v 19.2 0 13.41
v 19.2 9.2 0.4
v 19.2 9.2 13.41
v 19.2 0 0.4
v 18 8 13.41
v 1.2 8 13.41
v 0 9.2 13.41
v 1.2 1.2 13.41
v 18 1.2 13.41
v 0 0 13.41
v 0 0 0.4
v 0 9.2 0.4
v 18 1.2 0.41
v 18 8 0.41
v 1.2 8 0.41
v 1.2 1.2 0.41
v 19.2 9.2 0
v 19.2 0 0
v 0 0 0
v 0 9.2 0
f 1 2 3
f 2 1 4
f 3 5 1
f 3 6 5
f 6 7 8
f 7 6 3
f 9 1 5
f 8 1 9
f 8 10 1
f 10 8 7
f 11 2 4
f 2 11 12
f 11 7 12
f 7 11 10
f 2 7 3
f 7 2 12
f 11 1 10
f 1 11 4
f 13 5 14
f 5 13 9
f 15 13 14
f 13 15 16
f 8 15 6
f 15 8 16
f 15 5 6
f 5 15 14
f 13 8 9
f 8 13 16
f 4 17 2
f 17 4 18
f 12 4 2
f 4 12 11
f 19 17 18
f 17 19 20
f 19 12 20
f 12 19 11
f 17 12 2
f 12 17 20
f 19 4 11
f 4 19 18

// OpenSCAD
// file: ../../Base/Boxes.scad
// Fischertechnik Box Foundation
// Pre-designed Boxes

use <Constants.scad>

include <PlacementOptions.scad>

box190Width = 190;
box190Depth = 130;
box130Width = 130;
box130Depth = 95;
boxUsageHeight = 33.9;
boxWallThickness = 2.4;
boxBaseThickness = 1.0;
boxWebWidth = 3.0;

// getBoxWallThickness()
// Gets the wall thickness of a Fischertechnik Box

function getBoxWallThickness() = boxWallThickness;

// Gets the usable height of a fischertechnik box
function getBoxUsageHeight() = boxUsageHeight;

// Gets the thickness of the Fischertechnik box base.
function getBoxBaseThickness() = boxBaseThickness;

// Gets the width of a box web
function getBoxWebWidth() = boxWebWidth;

// Gets the usable inner space of a Box 190 as an x/y-list
function getBox190Space() = [
    box190Width - 2*getBoxWallThickness(), 
    box190Depth - 2*getBoxWallThickness() ];

// Imports the Fischertechnik empty box 130x190 mm and places it at position 0,0
// 190x130 are the outer sizes, the inner space is slightly smaller. Use getBox190Space() to get the inner sizes.
// This module needs the STL file "Fischertechnik Box 130x190.stl" in the library path.
// The box is positioned that the usable inner space is at the 0,0,0 position. The

module Box190() {
    translate([-getBoxWallThickness(),-getBoxWallThickness(),-getBoxBaseThickness()])
        import("Fischertechnik Box 130x190.stl", convexity=3);
}

// Gets the usable inner space of a Box 130 as an x/y-list
function getBox130Space() = [
    box130Width - 2*getBoxWallThickness(), 
    box130Depth - 2*getBoxWallThickness() ];

// Imports the Fischertechnik empty box 95x130 mm and places it at position 0,0
// 190x130 are the outer sizes, the inner space is slightly smaller. Use getBox190Space() to get the inner sizes.
// This module needs the STL file "Fischertechnik Box 95x130.stl" in the library path.
// The box is positioned that the usable inner space is at the 0,0,0 position. The

module Box130() {
    translate([-getBoxWallThickness(),-getBoxWallThickness(),-getBoxBaseThickness()])
        import("Fischertechnik Box 95x130.stl", convexity=3);
}

// Creates a web at the specified box walls
// corner 0 = LowerLeft, 1 = UpperLeft, 2 = UpperRight, 3 = LowerRight
// side 0 = LeftOfCorner, 1 = RightOfCorner
// distance = Distance in mm from the corner
// box = inner width and depth of the box (default: Box 190)
// webWidth = length of the web (default is 3 mms)
// webThickness = thickness of the web (default is 1 mm)

module BoxWeb(corner, side, distance, box=getBox190Space(), webWidth=getBoxWebWidth(), webThickness=1.0) {
    sink = getBoxWallThickness()/2;

    width = (corner % 2 == 0) ? 
            (side == LeftOfCorner ? webWidth : webThickness) :
            (side == LeftOfCorner ? webThickness : webWidth);

    depth = (corner % 2 == 0) ? 
            (side == RightOfCorner ? webWidth : webThickness) :
            (side == RightOfCorner ? webThickness : webWidth);
    
    xDiff = corner == LowerLeft ? 
                (side == LeftOfCorner ? -sink : distance) :
            (corner == UpperLeft ?                
                (side == LeftOfCorner ? distance : -sink) :
            (corner == UpperRight ?
                (side == LeftOfCorner ? box.x-webWidth+sink : box.x-distance-webThickness) :
                (side == LeftOfCorner ? box.x-distance-webThickness: box.x-webWidth+sink)));

    yDiff = corner == LowerLeft ? 
                (side == RightOfCorner ? -sink : distance) :
            (corner == UpperLeft ?
                (side == RightOfCorner ? box.y-distance : box.y-webWidth+sink) :
            (corner == UpperRight ?
                (side == RightOfCorner ? box.y-webWidth+sink : box.y-distance) :
                (side == RightOfCorner ? distance : -sink)));
    
    translate([xDiff, yDiff, -getExcess()])
        cube([width, depth, boxUsageHeight + 2*getExcess()]);
}
// file: ../../Base/Rotation.scad
// Fischertechnik Box Foundation
// Geometry Helpers Rotation

include <PlacementOptions.scad>

// getRotatedSpace(space, rotation=NoRotation)
// Rotates the space dependent on the specified rotation

function getRotatedSpace(space, rotation=NoRotation) = [
    (rotation == Rotate90 || rotation == Rotate270) ? space.y : space.x,
    (rotation == Rotate90 || rotation == Rotate270) ? space.x : space.y
];

// Rotates the given space around the fixed left lower corner
// space = the space the children needs as width/depth list [width,depth]
// rotation = 0 Rotate0 degrees, 1 Rotate90 degrees, 2 Rotate180 degrees, 3 Rotate270 degrees (equivalent to -90)

module RotateFix(space, rotation=Rotate0) {
    dy = (rotation == Rotate0 || rotation == Rotate270) ? 0 :
        (rotation == Rotate90) ? space.x :
        space.y;
    dx = (rotation < Rotate180) ? 0 :
        (rotation == Rotate180) ? space.x :
        space.y;
    
    translate([dx, dy, 0])
        rotate([0, 0, rotations[rotation]])
            children();
}
// file: ../../Base/Alignment.scad
// Fischertechnik Box Foundation
// Geometry Helpers Alignment

include <PlacementOptions.scad>

// getAlignedX(elementWidth, spaceWidth, align=AlignRight, offset=0)
// Gets the aligned X offset of an element with the given
// width in the given space.
// elementWidth = The width of the element to positon
// spaceWidth = The space where the element should be aligned
// align = 0 AlignLeft, 1 AlignCenter, 2 AlignRight
// offset = an optional offset from the aligned position. When
// aligned left or centered, then positive values are in X direction.
// When aligned right then positive values are in negative X direction.

function getAlignedX(elementWidth, spaceWidth, align=AlignRight, offset=0) =
    (align == AlignLeft) ?
        offset :
        ((align == AlignCenter) ?
        (spaceWidth - elementWidth)/2 + offset :
        spaceWidth - offset - elementWidth);

// getAlignedY(elementDepth, spaceDepth, align=AlignTop, offset=0)
// Gets the aligned Y offset of an element with the given
// depth in the given space.
// elementDepth = The depth of the element to positon
// spaceDepth = The space where the element should be aligned
// align = 0 AlignBottom, 1 AlignCenter, 2 AlignTop
// offset = an optional offset from the aligned position. When
// aligned bottom or centered, then positive values are in Y direction.
// When aligned top then positive values are in negative Y direction.

function getAlignedY(elementDepth, spaceDepth, align=AlignTop, offset=0) =
    (align == AlignBottom) ?
        offset :
        ((align == AlignCenter) ?
        (spaceDepth - elementDepth)/2 + offset :
        spaceDepth - offset - elementDepth);
// file: ../../Base/PlacementOptions.scad
// Fischertechnik Box Foundation
// Placement Options

// Alignment
NoAlign = 0;
AlignLeft = 1;
AlignBottom = 2;
AlignCenter = 3;
AlignRight = 4;
AlignTop = 5;

// Element rotation degree steps
rotations = [0, -90, -180, -270];

// Rotation
NoRotation = 0;
Rotate0 = 0;
Rotate90 = 1;
Rotate180 = 2;
Rotate270 = 3;

// Docking (seen from above)
NoDock = -1;
DockLeft = 0;
DockTop = 1;
DockRight = 2;
DockCorner = 2;
DockBottom = 3;

// Web corners
LowerLeft = 0;
UpperLeft = 1;
UpperRight = 2;
LowerRight = 3;

// Web position relative to corner
LeftOfCorner = 0;
RightOfCorner = 1;
// file: ../../Base/Placement.scad
// Fischertechnik Box Foundation
// Geometry Helpers Placement

use <Constants.scad>
use <Alignment.scad>
use <Rotation.scad>
use <Boxes.scad>

include <PlacementOptions.scad>

// Place(x=0, y=0, elementSpace=[0,0], alignX=AlignLeft, alignY=AlignBottom, rotation=Rotate0, boxSpace=getBox190Space())
// Places the child at the specified position
// y = Y-Position. This is a relative position when an X aligment is specified.
// x = X-Position. This is a relative position when an Y aligment is specified.
// elementSpace = space of the element to be placed [x,y]
// alignX = -1=NoAlign, 0 AlignLeft, 1 AlignCenter, 3 AlignRight (elementSpace and boxSpace required!)
// alignY = -1=NoAlign, 2 AlignBottom, 1 AlignCenter, 4 AlignTop (elementSpace and boxSpace required!)
// rotation = 0 Rotate0 0 degrees, 1 Rotate90 90 degrees, 
// 2 Rotate180 180 degrees, 3 Rotate270 270 degrees (equivalent to -90)
// boxSpace = Inner space of the box where the placement occurs [x,y] - default is Box 190x130 inner space

module Place(x=0, y=0, elementSpace=[0,0], 
  alignX=AlignLeft, alignY=AlignBottom, 
  rotation=NoRotation, boxSpace=getBox190Space()) {

    module Position(x, y, space, rotation=Rotate0) {
        translate([x, y, 0])
            RotateFix(space, rotation)
                children();
    }

    space = getRotatedSpace(elementSpace, rotation);
    alignedX = getAlignedX(space.x, boxSpace.x, alignX, x);
    alignedY = getAlignedY(space.y, boxSpace.y, alignY, y);
    Position(alignedX, alignedY, elementSpace, rotation)
        children();
}

// Center(space=getBox130Space(), elementSpace=[0,0])
// space = Space where the children is centered. For cylinder use centered=true and no elementSpace.
// elementSpace = space of the element to be centered [x,y]

module Center(space=getBox190Space(), elementSpace=[0,0]) {
    translate([(space.x - elementSpace.x) / 2, (space.y - elementSpace.y) / 2])
        children(0);
}

// CenterHorizontal(width=0, y=0, offset=0, space=getBox130Space())
// space = Space where the children is centered. For cylinder use centered=true and no elementSpace.
// elementSpace = space of the element to be centered [x,y]

module CenterHorizontal(width=0, y=0, offset=0, space=getBox190Space()) {
    translate([(space.x - width) / 2 + offset, y])
        children(0);
}

// CenterVertical(depth=0, x=0, offset=0, space=getBox130Space())
// space = Space where the children is centered. For cylinder use centered=true and no elementSpace.
// elementSpace = space of the element to be centered [x,y]

module CenterVertical(depth=0, x=0, offset=0, space=getBox190Space()) {
    translate([x, (space.y - depth) / 2 + offset])
        children(0);
}
// file: ../../Elements/AxisClip10.scad
// Fischertechnik Box Library
// Axis for clip 10
// 31023

use <../ModelBase/Simple.scad>

width = 12;
depth = 12;
height = 23;

// getAxisClip10Space()
// Gets the space of a frame for a clip 10 with spring ring (mot2)

function getAxisClip10Space() = [width, depth, height];

// AxisClip10()
// Axis for clip 10 with spring ring (mot2)

module AxisClip10() {
    LeveledAxisWithSpace(height, height-10, getAxisClip10Space());
}

// Tests
color("lightgray")
AxisClip10();
// file: ../../Base/Constants.scad
// Fischertechnik Box Foundation
// Constants

// Constant values necessary for multiple elements

// Base constants
dividerThickness = 1.2;
excess = 0.01;
fragments = 90;
tolerance = 0.8;

// Gets the thickness of a divider 
function getDividerThickness() = dividerThickness;

// Gets the excess that is used to merge walls into each other
function getExcess() = excess;

// Gets amount of fragments of a cylinder
function getFragments() = fragments;

// Gets the inner tolerance of a frame to each side
function getTolerance() = tolerance;


// Fischertechnik specific constants
axisDiameter = 4;
axisBottomDiameter = axisDiameter + 1;
standardEdgeDistance = 2.5;
standardWebDistance = 11.5;
standardCornerLength = 15;
tubeWallFactor = 0.8;

// Gets axis diameter
function getAxisDiameter() = axisDiameter;

// Gets axis bottom diameter for thicker part at the bottom
function getAxisBottomDiameter() = axisBottomDiameter;

// gets the standard distance to the wall of the box for dockable frames with webs
function getStandardEdgeDistance() = standardEdgeDistance;

// gets the standard distance of each web to the corner of the dockable frame
function getStandardWebDistance() = standardWebDistance;

// gets the standard length of the corner walls of a dockable frame
function getStandardCornerLength() = standardCornerLength;

// gets the wall thickness of a tube.
function getTubeWallThickness() = tubeWallFactor * getDividerThickness();
// file: ../../Elements/FramePluggedResistor.scad
// Fischertechnik Box Library
// Frame for Plugged Resistor (two plugs)
// 36381

use <../ModelBase/Simple.scad>

width = 16;
depth = 6;
height = 13;

// getFramePluggedResistorSpace()
// Gets the space the frame for a plugged capacitor needs as width and depth (.x and .y as a list)

function getFramePluggedResistorSpace() = getFrameOuterVolume([width, depth, height]);

// FramePluggedResistor()
// The walls of the frame are 13 mm high. 
// The complete frame has a tolerance of addition 1 mm in each direction.

module FramePluggedResistor() {
    Frame([width, depth, height]);
}

// Tests
color("lightgray") {
FramePluggedResistor();
}
// file: ../TestPrint.scad
// 3D Print Test Base

use <../Base/Constants.scad>

use <../Elements/AxisClip10.scad>

module TestPrint(elementSpace) {
    cube([elementSpace.x, elementSpace.y, 0.4]);
    translate([0,0,0.4+getExcess()]) {
        children();
    }
}

TestPrint(getAxisClip10Space())
    AxisClip10();
// main file
// 3D Print Test Base
// FramePluggedResistor

use <../TestPrint.scad>
use <../../Elements/FramePluggedResistor.scad>

TestPrint(getFramePluggedResistorSpace())
    FramePluggedResistor();
